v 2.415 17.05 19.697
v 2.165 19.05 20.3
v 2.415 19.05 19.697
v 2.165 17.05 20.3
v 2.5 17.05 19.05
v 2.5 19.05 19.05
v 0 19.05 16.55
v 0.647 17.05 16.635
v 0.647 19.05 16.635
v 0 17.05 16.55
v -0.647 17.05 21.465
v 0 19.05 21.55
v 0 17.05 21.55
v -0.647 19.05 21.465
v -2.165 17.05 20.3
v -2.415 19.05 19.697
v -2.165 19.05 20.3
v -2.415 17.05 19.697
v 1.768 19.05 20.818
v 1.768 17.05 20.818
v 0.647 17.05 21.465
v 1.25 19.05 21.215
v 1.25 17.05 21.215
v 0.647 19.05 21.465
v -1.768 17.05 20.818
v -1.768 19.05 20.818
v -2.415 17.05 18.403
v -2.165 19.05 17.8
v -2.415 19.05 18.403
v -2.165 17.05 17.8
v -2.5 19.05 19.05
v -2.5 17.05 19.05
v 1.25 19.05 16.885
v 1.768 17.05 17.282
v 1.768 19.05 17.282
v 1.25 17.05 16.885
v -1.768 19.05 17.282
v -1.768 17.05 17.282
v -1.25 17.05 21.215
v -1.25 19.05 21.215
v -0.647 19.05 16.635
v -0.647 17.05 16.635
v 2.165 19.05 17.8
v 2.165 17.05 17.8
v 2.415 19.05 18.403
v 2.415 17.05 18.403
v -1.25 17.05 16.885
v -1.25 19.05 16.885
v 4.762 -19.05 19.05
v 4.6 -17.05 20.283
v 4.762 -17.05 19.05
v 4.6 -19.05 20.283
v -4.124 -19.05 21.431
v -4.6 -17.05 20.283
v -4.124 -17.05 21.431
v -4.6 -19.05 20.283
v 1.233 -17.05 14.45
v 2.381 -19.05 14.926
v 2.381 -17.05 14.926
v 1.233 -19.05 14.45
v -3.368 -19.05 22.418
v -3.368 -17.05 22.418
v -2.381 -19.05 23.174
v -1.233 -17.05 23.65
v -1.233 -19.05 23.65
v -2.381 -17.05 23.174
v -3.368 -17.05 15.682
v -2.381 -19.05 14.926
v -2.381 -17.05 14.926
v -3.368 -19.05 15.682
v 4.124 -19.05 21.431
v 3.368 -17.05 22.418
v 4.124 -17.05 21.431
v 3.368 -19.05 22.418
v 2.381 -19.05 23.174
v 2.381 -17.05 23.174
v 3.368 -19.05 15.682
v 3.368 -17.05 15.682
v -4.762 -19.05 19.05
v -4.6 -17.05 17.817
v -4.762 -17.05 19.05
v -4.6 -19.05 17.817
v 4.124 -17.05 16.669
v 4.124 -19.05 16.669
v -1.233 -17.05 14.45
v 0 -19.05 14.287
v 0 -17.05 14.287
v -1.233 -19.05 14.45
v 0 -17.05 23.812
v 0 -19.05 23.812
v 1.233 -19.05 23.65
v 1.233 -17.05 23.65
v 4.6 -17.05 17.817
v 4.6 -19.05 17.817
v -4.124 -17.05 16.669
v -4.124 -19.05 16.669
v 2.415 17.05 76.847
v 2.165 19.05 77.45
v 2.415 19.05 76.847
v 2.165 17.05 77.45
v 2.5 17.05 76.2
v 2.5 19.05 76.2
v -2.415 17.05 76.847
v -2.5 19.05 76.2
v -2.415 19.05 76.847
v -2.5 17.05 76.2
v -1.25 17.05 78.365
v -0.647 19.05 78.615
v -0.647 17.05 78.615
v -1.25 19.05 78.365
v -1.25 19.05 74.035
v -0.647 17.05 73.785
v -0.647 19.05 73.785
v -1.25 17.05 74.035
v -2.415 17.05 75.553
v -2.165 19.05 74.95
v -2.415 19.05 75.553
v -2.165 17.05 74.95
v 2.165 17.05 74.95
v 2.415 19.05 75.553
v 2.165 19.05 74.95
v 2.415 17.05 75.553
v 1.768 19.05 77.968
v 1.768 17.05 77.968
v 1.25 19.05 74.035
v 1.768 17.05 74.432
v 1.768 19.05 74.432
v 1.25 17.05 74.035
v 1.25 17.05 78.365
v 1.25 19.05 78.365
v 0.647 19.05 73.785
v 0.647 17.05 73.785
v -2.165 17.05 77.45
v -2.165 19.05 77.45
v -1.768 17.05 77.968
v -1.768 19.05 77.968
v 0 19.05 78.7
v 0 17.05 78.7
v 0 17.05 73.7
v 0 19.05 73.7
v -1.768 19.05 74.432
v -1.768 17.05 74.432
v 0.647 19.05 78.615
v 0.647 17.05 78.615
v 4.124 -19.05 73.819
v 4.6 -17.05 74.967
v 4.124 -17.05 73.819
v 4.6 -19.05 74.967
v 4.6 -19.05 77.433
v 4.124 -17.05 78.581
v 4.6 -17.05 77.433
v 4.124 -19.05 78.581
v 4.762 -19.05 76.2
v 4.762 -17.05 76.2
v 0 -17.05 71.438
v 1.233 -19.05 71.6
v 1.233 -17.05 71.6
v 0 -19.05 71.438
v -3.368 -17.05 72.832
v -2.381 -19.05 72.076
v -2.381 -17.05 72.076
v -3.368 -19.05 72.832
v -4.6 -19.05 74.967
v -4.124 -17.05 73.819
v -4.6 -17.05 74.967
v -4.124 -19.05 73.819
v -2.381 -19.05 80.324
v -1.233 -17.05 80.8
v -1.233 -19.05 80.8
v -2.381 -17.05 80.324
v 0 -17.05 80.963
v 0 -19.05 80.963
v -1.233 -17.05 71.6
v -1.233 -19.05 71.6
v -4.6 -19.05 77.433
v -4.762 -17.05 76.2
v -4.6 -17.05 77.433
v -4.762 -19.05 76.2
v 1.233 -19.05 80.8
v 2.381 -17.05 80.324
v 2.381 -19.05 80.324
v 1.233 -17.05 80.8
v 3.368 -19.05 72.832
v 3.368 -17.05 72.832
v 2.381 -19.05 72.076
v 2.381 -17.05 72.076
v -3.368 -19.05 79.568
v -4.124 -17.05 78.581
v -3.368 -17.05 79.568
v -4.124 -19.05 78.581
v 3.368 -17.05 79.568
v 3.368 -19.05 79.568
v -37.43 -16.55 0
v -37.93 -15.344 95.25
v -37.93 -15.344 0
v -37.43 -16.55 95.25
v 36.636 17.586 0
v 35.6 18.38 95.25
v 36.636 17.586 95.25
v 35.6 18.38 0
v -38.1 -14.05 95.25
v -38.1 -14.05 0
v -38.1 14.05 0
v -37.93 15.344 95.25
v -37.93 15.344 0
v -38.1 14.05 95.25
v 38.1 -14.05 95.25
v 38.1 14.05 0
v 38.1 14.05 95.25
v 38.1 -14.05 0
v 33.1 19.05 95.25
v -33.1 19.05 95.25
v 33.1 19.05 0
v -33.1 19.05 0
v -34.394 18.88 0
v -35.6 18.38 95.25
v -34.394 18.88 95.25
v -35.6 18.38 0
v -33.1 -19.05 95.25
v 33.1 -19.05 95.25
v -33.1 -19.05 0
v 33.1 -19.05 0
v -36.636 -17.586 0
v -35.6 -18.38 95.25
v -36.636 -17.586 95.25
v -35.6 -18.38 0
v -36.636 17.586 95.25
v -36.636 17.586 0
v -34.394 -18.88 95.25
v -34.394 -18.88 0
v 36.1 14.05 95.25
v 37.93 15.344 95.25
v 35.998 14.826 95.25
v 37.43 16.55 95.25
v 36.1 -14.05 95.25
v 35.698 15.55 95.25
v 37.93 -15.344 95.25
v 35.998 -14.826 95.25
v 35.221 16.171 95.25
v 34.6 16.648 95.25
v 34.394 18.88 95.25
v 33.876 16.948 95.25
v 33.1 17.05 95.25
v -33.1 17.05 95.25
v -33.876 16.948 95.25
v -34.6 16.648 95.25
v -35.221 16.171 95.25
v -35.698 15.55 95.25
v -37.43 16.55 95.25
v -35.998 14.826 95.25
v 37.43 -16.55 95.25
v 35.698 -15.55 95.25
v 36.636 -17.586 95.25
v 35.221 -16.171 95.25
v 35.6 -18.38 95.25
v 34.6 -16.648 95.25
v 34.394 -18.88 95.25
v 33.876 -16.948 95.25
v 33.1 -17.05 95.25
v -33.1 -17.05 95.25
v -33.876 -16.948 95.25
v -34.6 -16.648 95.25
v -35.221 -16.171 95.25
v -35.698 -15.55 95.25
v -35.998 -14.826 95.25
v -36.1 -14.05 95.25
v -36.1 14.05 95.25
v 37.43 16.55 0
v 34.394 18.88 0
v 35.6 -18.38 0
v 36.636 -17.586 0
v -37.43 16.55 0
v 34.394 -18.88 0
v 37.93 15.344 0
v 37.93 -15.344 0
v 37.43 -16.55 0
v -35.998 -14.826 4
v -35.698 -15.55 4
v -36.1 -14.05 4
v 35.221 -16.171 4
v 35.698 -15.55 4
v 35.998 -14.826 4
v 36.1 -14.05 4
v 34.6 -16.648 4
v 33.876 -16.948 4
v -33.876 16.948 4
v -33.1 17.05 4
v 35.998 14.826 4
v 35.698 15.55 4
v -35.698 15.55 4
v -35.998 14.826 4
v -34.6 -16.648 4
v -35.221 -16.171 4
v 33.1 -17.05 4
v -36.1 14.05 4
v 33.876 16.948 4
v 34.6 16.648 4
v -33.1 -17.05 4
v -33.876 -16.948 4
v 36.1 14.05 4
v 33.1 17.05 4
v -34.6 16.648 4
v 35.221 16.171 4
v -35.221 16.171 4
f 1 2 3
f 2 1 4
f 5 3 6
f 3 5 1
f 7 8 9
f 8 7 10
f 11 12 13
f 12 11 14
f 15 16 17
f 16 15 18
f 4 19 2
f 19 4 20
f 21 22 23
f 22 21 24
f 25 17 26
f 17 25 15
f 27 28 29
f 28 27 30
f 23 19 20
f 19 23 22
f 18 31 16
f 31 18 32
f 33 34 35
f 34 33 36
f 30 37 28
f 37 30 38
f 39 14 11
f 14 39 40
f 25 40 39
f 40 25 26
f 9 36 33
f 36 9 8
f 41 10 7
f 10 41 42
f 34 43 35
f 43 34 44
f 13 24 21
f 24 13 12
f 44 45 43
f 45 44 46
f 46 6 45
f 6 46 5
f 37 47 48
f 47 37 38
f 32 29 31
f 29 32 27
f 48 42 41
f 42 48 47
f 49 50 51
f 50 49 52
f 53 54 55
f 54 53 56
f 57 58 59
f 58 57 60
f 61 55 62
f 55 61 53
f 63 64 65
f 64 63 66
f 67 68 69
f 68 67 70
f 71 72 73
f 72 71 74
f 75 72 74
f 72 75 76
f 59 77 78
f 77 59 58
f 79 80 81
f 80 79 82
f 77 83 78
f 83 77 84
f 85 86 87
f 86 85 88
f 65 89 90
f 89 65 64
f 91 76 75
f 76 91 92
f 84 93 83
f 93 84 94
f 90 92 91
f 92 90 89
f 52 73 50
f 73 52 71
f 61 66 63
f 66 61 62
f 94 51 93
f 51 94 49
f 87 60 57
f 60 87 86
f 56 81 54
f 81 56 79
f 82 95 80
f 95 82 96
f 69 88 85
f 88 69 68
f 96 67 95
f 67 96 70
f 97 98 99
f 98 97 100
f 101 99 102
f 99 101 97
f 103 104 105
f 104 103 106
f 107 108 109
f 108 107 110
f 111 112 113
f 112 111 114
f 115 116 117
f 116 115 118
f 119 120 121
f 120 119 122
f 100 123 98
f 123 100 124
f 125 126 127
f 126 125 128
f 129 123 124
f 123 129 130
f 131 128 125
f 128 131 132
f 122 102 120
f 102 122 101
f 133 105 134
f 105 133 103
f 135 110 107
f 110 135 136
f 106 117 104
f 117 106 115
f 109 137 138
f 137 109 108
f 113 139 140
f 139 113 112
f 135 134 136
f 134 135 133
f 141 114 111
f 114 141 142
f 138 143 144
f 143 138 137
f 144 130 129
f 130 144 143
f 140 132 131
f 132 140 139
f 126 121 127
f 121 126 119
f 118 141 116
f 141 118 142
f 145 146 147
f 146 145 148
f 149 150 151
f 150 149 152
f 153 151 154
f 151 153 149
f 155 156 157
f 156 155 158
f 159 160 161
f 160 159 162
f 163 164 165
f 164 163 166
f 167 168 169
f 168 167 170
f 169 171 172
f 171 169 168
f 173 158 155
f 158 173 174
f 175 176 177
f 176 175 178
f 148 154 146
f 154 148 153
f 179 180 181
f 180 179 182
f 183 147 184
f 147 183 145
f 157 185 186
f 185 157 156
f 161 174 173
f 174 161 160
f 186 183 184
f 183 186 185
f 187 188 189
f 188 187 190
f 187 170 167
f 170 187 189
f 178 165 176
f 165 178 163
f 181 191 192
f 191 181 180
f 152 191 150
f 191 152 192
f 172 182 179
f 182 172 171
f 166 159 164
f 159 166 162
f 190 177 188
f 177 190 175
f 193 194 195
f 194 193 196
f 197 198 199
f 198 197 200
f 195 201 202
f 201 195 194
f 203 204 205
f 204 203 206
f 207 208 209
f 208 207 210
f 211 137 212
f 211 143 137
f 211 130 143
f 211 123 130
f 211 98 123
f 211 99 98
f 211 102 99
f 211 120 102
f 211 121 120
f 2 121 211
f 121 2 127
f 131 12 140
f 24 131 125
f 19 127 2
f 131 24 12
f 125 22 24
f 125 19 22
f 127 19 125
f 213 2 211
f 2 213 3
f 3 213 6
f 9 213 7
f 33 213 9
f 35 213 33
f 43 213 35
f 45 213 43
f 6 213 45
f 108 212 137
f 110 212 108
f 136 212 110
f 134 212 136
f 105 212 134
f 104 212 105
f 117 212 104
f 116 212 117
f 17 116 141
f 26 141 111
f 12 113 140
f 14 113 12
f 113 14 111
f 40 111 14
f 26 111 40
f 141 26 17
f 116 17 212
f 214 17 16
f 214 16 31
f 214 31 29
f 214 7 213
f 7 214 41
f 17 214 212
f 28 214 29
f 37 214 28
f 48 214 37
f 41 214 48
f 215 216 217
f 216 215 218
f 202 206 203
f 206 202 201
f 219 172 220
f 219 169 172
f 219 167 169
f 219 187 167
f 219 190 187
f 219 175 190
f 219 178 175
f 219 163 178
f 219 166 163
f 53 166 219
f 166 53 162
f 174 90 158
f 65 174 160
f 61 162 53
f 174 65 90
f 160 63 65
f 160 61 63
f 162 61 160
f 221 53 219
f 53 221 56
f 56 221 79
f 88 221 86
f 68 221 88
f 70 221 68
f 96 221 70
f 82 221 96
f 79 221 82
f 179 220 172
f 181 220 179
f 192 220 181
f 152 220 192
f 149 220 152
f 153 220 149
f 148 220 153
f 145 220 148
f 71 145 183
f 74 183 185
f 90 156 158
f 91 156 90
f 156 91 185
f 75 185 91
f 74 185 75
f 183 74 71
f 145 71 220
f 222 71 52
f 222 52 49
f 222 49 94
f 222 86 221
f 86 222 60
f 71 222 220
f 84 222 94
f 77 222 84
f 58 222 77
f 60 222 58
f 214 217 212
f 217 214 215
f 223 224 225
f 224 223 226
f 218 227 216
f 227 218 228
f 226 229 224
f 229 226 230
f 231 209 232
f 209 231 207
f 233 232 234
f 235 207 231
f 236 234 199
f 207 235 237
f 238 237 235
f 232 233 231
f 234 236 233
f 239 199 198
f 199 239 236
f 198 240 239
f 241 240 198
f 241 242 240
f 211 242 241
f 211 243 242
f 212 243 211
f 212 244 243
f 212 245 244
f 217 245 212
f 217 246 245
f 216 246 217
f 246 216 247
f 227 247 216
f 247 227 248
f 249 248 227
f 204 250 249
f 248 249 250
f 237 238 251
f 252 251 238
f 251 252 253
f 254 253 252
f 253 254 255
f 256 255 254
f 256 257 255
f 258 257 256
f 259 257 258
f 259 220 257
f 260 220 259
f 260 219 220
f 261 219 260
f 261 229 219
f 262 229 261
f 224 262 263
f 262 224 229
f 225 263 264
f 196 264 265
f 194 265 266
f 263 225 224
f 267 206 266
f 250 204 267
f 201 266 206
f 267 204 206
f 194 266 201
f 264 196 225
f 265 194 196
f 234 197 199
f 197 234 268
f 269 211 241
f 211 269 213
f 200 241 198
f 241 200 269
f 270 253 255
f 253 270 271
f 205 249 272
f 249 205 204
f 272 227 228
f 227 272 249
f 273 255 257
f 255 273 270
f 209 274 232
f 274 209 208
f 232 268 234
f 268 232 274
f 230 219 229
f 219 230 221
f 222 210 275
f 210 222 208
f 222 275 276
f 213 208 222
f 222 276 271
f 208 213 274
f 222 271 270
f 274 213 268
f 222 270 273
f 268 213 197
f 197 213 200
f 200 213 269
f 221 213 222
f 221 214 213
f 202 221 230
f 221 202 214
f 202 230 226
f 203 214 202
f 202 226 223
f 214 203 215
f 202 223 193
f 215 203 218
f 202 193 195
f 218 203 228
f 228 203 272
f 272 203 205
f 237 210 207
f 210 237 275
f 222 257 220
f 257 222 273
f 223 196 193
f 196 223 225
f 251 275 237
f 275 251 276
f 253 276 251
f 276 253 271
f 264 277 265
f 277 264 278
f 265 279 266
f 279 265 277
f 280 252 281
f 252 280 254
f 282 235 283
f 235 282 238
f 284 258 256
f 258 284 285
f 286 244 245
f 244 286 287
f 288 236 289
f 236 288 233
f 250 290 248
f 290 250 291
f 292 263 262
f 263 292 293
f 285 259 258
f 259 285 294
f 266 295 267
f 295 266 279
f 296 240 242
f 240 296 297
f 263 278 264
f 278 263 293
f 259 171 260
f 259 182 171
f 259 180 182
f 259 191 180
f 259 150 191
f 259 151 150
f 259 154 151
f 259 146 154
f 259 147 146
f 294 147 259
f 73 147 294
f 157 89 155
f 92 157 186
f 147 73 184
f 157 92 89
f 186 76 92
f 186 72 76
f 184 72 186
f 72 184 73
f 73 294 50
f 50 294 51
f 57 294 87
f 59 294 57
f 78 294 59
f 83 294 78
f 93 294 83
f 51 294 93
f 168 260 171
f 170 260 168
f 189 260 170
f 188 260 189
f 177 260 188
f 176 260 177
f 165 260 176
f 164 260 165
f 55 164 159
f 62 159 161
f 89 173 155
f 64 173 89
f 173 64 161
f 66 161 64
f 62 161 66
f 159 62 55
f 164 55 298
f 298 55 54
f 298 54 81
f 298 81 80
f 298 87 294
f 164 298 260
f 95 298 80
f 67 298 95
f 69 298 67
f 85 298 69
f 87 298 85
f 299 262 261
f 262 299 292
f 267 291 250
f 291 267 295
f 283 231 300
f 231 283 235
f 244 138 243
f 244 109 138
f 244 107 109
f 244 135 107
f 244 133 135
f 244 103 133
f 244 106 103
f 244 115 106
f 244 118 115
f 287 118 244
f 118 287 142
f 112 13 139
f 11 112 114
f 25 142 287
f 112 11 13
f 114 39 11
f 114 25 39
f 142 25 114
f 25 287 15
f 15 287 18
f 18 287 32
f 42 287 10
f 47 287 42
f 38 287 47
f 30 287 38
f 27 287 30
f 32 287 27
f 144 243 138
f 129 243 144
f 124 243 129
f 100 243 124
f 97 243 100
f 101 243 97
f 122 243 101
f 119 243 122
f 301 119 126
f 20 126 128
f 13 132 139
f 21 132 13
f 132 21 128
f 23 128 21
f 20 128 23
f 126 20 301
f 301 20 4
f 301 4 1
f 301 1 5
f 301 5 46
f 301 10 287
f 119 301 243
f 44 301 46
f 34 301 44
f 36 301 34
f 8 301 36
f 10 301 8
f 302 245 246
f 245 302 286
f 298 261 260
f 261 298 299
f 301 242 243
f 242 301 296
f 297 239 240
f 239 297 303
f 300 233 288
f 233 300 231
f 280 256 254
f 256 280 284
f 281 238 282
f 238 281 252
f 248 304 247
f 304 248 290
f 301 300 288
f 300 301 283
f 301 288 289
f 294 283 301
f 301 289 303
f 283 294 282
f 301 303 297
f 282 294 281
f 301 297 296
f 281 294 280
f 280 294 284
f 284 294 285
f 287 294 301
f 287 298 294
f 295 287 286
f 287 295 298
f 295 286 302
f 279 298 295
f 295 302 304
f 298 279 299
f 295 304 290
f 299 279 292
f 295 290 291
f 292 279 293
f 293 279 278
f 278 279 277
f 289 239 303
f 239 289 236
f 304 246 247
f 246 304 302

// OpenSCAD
inch = 25.4;
$fn = 24;

height = 3.75*inch;

module rounded_square(size, corner_radius, offset=0) {
	hull() for( ym=[-1,1] ) for( xm=[-1,1] ) {
		translate([
			xm*(size[0]/2-corner_radius),
			ym*(size[1]/2-corner_radius),
		]) circle(r=corner_radius+offset);
	}
}
module xy_rounded_cube(size, corner_radius) {
	linear_extrude(size[2], center=true) rounded_square(size, corner_radius);
}

difference() {
	translate([0,0,height/2]) xy_rounded_cube([3*inch, 1.5*inch, height], corner_radius=5);
	translate([0,0,height]) xy_rounded_cube([3*inch-4, 1.5*inch-4, height*2-8], corner_radius=3);
	for( zi=[0.75, 3.0] ) {
		translate([0,  0.75*inch, zi*inch]) rotate([90,0,0]) cylinder(d=5, h=5, center=true);
		translate([0, -0.75*inch, zi*inch]) rotate([90,0,0]) cylinder(d=3/8*inch, h=5, center=true);
	}
}

if( $preview ) {
	translate([-0.75*inch, 0, 4]) color("yellow") cylinder(d=5/16*inch, h=7.5*inch);
	translate([    0*inch, 0, 4]) color("yellow") cylinder(d=5/16*inch, h=6*inch);
	translate([ 0*inch, 0, 4]) color("yellow") rotate([0,20,0]) cylinder(d=5/16*inch, h=(5+1/4)*inch);
}
